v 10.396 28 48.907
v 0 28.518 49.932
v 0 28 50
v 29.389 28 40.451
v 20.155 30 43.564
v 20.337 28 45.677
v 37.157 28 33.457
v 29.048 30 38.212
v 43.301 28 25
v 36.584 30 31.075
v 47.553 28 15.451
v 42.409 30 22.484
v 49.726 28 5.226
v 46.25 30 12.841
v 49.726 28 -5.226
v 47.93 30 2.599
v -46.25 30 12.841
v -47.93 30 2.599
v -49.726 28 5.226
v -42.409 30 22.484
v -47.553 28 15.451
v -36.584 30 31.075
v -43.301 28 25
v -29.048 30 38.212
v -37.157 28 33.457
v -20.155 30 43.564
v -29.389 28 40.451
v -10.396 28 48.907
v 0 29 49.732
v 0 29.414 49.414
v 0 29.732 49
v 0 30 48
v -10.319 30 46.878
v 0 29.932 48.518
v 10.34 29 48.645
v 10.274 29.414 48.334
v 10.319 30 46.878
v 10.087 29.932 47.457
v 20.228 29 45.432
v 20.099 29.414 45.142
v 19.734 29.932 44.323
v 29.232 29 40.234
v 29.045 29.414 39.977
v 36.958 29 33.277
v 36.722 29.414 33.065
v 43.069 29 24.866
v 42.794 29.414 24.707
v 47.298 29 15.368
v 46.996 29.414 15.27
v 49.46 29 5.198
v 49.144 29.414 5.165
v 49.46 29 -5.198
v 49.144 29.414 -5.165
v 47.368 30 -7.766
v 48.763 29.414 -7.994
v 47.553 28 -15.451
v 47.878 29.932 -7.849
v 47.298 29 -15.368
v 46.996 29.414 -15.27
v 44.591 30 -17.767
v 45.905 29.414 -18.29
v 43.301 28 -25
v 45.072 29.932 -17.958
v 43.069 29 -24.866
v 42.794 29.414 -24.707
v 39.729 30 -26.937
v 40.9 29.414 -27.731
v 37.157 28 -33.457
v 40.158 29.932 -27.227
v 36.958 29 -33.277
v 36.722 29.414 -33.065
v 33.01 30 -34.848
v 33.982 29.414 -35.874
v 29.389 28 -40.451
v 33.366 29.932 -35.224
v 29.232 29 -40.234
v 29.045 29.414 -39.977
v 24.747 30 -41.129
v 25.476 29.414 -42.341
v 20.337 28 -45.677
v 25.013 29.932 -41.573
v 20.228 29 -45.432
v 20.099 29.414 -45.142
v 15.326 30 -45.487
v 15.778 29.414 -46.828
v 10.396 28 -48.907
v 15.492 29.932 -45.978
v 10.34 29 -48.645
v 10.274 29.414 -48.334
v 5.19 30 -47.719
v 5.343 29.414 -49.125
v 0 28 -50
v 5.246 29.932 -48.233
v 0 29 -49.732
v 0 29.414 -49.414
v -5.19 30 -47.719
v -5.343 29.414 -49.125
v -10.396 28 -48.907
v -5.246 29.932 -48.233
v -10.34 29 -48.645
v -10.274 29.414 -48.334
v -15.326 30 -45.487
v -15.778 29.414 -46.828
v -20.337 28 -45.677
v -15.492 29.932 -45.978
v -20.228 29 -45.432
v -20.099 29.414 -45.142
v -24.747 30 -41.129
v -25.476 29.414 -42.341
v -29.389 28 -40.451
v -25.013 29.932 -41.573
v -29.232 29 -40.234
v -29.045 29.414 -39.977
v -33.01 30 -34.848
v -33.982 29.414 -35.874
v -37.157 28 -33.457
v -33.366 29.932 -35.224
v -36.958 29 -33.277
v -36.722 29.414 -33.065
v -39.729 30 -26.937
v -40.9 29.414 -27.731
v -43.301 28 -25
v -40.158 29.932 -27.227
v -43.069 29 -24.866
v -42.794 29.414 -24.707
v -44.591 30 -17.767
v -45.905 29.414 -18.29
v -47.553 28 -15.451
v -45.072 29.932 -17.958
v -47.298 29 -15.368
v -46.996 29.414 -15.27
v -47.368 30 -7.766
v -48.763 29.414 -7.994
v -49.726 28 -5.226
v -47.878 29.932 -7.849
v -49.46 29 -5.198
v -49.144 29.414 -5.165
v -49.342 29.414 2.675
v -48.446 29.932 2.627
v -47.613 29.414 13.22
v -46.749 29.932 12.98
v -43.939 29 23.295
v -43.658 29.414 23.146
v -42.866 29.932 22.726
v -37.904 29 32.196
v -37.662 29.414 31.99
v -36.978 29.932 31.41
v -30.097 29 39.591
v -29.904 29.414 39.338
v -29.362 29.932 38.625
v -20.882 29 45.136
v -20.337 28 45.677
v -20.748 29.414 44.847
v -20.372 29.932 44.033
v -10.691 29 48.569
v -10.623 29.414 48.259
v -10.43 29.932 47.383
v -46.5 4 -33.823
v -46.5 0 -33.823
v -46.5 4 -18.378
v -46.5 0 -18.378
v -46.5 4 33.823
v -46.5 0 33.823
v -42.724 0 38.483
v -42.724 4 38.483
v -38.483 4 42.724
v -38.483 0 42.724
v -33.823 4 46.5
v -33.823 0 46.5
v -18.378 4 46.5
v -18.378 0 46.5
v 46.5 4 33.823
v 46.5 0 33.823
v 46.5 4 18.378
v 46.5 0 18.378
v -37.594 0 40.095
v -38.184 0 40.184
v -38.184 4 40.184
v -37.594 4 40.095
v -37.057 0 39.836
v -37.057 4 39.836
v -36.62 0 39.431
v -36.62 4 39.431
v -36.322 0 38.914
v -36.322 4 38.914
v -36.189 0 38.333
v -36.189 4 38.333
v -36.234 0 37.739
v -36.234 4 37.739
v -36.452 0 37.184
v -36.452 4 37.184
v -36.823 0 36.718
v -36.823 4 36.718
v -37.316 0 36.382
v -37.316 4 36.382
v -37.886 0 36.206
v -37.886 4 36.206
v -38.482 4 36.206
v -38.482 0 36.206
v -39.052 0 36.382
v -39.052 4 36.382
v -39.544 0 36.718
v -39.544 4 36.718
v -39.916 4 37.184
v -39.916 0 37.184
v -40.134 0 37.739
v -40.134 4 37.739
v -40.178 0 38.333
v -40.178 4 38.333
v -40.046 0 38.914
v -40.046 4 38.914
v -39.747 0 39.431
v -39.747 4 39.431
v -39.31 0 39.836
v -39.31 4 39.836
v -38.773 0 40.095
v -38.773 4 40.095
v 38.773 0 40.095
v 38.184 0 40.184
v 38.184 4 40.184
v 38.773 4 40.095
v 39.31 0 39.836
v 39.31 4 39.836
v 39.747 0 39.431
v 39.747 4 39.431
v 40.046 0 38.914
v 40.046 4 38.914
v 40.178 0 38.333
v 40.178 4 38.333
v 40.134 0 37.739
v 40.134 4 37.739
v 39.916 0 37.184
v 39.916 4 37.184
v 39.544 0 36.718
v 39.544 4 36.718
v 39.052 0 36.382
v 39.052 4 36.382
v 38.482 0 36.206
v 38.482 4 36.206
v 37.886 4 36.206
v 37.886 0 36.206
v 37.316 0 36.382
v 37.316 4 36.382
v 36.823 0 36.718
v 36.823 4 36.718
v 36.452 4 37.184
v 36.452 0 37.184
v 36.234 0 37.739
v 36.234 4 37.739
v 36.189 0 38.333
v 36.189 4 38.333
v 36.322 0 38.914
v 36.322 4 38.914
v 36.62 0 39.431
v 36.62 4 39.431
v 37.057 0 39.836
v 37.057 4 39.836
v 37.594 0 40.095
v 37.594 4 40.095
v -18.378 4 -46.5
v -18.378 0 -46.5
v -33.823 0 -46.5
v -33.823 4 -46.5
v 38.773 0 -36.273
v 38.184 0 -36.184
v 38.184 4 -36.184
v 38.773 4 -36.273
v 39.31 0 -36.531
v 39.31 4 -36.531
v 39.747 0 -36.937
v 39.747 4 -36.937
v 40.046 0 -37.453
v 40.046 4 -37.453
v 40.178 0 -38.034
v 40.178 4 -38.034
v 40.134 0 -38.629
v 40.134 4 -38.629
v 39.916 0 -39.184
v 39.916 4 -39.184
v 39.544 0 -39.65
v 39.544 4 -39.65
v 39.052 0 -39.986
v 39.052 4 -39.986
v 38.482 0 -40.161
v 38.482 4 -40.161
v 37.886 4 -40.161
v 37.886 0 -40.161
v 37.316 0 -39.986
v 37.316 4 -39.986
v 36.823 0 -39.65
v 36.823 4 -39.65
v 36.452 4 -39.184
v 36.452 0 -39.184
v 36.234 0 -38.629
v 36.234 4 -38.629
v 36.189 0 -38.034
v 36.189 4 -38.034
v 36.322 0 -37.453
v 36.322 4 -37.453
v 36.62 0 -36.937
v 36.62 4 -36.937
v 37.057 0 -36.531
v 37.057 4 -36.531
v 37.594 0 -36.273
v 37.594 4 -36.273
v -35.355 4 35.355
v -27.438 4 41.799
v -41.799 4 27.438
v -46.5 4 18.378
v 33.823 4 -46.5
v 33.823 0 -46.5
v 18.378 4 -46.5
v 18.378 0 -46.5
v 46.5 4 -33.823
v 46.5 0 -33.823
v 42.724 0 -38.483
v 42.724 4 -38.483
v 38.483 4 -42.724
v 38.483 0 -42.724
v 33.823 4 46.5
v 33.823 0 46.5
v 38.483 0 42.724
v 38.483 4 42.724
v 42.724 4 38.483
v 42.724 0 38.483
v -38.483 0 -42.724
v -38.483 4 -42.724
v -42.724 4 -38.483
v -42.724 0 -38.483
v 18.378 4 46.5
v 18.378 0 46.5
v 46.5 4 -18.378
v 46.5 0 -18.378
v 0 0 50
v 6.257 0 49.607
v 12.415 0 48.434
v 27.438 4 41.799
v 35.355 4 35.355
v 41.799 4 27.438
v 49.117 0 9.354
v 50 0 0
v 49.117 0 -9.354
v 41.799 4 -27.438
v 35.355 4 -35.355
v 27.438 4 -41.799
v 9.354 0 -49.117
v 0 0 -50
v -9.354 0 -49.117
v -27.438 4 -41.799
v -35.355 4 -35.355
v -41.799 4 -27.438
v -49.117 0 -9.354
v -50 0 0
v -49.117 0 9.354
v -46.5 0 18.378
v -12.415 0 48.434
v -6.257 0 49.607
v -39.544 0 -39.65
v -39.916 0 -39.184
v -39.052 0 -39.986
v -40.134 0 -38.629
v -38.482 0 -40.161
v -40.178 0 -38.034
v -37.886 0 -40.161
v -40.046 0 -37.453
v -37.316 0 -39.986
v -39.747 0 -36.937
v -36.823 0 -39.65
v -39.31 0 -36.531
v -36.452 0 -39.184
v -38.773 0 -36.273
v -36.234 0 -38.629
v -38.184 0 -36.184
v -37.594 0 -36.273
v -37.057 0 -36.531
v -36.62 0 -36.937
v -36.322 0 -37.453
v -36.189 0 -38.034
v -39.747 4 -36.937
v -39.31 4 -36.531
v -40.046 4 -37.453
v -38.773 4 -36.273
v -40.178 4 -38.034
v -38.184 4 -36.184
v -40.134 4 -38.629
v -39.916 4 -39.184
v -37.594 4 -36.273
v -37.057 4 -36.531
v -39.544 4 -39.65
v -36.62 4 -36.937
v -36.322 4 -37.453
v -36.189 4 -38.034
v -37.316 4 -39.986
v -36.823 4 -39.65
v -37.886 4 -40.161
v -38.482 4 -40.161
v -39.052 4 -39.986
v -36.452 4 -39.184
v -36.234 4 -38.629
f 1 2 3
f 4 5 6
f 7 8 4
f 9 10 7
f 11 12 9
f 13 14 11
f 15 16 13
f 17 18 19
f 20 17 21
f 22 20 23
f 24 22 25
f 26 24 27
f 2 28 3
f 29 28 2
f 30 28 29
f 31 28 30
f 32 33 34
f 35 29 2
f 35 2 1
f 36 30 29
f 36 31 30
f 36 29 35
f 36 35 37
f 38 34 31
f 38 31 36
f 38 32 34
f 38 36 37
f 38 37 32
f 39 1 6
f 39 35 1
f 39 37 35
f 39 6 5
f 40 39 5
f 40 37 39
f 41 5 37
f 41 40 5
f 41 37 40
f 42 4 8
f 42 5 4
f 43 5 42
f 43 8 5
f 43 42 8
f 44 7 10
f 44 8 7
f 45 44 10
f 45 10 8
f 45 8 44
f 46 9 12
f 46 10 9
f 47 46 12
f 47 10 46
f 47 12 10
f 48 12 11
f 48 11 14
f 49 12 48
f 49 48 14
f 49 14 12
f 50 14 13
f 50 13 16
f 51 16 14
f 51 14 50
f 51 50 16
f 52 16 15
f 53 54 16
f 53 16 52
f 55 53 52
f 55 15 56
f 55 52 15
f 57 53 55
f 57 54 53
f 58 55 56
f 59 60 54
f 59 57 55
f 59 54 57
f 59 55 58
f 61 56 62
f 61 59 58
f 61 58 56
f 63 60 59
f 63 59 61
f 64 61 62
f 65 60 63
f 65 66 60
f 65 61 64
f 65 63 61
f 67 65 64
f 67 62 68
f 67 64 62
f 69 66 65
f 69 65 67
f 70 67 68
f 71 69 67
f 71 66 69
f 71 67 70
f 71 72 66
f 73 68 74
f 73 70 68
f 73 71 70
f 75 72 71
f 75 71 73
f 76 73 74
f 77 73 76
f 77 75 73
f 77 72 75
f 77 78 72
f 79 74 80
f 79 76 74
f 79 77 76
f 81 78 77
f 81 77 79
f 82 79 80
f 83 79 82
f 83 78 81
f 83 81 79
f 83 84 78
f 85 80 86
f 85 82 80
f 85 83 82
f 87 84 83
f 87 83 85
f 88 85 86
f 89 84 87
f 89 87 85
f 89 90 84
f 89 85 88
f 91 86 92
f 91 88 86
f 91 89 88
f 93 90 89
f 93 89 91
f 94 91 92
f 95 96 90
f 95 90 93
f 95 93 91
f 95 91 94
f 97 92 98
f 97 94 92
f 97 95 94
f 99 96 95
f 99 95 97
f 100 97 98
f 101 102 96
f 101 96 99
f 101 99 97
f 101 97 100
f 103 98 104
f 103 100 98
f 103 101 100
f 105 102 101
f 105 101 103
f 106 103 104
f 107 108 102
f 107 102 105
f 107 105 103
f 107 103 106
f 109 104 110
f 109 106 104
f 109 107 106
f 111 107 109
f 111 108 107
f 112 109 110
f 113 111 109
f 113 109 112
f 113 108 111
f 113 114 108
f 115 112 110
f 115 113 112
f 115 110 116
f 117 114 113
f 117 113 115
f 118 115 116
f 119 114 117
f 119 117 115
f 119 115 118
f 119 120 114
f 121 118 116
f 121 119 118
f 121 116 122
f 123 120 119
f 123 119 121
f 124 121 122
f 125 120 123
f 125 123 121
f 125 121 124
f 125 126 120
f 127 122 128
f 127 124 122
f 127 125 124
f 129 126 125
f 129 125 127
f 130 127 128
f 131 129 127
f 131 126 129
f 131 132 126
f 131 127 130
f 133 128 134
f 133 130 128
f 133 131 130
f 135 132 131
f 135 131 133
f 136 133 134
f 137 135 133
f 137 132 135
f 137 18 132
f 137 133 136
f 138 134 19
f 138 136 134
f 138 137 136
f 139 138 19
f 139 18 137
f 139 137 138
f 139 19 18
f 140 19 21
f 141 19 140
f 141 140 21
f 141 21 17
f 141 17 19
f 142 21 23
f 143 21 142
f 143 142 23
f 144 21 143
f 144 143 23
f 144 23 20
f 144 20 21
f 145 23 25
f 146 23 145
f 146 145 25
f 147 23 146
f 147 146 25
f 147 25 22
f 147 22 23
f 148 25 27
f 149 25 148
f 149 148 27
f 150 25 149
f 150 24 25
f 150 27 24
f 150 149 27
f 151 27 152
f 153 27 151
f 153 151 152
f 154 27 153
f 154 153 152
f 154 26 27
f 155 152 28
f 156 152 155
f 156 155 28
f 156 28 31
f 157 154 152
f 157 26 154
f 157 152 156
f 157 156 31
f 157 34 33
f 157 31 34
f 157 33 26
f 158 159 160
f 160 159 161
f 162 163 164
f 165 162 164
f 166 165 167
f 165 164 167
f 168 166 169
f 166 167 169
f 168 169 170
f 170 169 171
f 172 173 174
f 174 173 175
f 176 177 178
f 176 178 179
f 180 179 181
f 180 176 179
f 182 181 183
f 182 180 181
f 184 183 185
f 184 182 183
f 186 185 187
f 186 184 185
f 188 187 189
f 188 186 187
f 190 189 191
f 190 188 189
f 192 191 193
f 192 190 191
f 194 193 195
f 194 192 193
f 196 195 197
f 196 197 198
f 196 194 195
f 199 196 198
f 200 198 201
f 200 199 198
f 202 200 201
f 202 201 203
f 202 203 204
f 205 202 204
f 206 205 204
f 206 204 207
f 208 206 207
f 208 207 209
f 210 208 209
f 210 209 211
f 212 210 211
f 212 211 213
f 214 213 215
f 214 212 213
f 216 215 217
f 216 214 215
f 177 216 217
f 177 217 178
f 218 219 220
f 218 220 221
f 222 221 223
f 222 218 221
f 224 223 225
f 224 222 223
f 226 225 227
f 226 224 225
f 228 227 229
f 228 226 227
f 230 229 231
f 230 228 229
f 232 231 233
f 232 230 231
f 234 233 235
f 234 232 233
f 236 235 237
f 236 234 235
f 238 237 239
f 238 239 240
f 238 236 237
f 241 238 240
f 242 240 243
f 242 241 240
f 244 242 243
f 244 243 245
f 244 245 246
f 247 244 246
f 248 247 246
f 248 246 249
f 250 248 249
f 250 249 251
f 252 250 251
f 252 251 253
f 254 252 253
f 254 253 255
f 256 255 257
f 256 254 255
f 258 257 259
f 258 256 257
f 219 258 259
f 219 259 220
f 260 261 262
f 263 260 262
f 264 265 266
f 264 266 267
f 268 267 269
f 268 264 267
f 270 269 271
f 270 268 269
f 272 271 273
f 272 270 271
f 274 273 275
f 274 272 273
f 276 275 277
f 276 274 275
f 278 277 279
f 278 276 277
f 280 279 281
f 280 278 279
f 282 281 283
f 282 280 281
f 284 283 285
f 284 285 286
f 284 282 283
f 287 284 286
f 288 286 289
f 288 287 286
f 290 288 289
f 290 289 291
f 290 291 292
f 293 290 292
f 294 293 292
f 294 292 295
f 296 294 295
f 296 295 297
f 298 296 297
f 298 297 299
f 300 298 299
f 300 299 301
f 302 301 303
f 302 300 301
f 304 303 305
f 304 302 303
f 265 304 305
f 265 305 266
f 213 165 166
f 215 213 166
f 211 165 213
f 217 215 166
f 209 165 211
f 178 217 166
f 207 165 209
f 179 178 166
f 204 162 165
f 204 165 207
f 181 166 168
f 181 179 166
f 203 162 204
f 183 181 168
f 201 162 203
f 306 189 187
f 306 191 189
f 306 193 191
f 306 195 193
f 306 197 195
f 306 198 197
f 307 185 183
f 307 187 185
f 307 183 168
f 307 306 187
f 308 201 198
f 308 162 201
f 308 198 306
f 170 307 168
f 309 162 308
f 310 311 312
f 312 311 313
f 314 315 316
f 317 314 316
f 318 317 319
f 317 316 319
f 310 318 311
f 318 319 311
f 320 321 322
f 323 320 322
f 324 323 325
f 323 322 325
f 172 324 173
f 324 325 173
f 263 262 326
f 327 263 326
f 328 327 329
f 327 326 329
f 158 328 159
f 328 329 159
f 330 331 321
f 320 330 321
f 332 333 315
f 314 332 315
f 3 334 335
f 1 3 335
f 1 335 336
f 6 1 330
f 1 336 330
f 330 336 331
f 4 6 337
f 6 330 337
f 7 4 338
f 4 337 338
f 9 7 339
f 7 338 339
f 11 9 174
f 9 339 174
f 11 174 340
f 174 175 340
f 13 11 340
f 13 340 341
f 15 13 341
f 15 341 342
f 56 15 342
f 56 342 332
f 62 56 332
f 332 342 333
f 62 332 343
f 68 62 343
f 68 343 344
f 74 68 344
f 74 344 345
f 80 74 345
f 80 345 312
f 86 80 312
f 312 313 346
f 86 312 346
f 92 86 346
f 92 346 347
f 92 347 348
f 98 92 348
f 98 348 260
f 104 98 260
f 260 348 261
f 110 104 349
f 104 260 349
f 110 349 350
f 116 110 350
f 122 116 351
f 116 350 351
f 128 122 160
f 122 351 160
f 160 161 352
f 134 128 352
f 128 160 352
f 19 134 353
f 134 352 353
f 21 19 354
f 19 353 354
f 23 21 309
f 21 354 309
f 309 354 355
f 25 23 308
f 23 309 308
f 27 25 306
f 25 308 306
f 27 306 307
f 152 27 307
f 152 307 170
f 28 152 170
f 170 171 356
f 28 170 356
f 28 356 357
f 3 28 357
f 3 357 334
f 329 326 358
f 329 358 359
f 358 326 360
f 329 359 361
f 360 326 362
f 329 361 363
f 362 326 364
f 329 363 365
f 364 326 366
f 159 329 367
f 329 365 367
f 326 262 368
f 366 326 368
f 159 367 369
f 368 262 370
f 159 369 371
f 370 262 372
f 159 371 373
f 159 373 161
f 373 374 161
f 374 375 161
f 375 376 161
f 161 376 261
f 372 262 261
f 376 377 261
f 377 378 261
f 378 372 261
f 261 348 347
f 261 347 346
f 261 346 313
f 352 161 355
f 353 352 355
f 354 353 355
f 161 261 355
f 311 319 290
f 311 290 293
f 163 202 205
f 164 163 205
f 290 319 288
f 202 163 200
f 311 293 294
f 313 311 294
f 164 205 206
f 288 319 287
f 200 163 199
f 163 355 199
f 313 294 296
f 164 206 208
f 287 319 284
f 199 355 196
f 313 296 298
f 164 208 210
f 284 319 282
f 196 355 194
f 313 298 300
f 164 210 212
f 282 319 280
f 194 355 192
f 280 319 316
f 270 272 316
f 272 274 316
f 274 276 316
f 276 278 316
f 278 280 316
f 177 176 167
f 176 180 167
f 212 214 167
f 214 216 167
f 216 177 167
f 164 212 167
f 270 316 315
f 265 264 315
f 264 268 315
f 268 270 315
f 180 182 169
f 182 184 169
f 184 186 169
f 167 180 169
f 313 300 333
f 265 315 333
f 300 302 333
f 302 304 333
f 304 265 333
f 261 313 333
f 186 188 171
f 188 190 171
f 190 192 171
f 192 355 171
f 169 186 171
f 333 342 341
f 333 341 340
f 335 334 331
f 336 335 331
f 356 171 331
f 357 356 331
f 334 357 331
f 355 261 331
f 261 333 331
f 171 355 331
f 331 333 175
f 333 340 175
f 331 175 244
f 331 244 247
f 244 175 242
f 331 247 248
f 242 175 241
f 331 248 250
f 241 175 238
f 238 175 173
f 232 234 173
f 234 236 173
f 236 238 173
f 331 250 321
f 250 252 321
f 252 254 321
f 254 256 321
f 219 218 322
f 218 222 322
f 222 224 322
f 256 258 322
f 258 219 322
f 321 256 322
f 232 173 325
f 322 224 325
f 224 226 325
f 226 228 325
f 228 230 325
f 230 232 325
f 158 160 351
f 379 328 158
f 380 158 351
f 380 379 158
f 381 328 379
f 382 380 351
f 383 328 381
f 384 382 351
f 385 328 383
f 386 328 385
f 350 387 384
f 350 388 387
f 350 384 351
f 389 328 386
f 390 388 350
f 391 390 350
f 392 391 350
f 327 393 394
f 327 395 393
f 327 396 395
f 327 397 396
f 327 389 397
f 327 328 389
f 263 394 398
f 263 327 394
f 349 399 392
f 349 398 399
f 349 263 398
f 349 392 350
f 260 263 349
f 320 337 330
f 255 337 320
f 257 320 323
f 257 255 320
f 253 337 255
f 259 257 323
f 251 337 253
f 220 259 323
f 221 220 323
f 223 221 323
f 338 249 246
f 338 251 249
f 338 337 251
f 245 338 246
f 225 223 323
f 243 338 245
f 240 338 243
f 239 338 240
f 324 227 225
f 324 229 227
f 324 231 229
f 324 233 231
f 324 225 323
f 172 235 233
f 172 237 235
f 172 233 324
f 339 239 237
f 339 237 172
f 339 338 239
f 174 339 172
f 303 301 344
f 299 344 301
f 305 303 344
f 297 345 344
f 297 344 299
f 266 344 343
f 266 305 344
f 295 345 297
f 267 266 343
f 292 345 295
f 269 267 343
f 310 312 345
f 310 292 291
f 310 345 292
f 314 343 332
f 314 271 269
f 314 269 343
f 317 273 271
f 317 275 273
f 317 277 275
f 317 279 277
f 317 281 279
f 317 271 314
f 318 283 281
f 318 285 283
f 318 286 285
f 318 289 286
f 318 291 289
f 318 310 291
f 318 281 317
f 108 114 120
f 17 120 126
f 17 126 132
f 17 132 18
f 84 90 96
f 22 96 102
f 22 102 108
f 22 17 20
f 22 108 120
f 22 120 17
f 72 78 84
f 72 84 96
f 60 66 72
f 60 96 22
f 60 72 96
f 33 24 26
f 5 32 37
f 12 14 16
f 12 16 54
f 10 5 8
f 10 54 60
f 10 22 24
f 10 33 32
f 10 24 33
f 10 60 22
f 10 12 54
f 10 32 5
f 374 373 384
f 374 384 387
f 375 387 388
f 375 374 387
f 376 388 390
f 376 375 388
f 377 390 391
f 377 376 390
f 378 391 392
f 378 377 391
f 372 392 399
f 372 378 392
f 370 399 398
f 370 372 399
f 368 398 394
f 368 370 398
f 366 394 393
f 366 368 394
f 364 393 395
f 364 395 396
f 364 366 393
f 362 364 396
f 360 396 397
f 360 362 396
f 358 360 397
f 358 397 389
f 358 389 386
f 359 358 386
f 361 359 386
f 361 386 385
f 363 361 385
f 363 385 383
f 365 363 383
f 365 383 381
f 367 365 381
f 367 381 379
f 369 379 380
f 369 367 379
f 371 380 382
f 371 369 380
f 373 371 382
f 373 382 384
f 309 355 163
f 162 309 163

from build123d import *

# Parameters (mm, degrees)
SKETCH1_R           = 50
BOSS_EXTRUDE1_DEPTH = 30
SKETCH1_3_R         = 2
BOSS_EXTRUDE2_DEPTH = 4
FILLET2_R           = 2


with BuildPart() as part:
    # Sketch1 → Boss-Extrude1 (new body)
    with BuildSketch(Plane(origin=(0, 0, 0), x_dir=(1, 0, 0), z_dir=(0, 1, 0))):
        Circle(SKETCH1_R)
    extrude(amount=BOSS_EXTRUDE1_DEPTH)

    # Sketch1<3> → Boss-Extrude2 (add)
    # profile 1 of 4: a face of its own
    with BuildSketch(Plane(origin=(0, 0, 0), x_dir=(1, 0, 0), z_dir=(0, 1, 0))):
        with BuildLine():
            Line((-33.823069051, -46.5), (-18.377975949, -46.5))
            ThreePointArc((-18.377975949, -46.5), (-35.355339059, -35.355339059), (-46.5, -18.377975949))
            Line((-46.5, -18.377975949), (-46.5, -33.823069051))
            ThreePointArc((-46.5, -33.823069051), (-40.658639918, -40.658639918), (-33.823069051, -46.5))
        make_face()
        with Locations((-38.183766184, -38.183766184)):
            Circle(SKETCH1_3_R, mode=Mode.SUBTRACT)
    # profile 2 of 4: a face of its own
    with BuildSketch(Plane(origin=(0, 0, 0), x_dir=(1, 0, 0), z_dir=(0, 1, 0))):
        with BuildLine():
            ThreePointArc((46.5, -18.377975949), (35.355339059, -35.355339059), (18.377975949, -46.5))
            Line((18.377975949, -46.5), (33.823069051, -46.5))
            ThreePointArc((33.823069051, -46.5), (40.658639918, -40.658639918), (46.5, -33.823069051))
            Line((46.5, -33.823069051), (46.5, -18.377975949))
        make_face()
        with Locations((38.183766184, -38.183766184)):
            Circle(SKETCH1_3_R, mode=Mode.SUBTRACT)
    # profile 3 of 4: a face of its own
    with BuildSketch(Plane(origin=(0, 0, 0), x_dir=(1, 0, 0), z_dir=(0, 1, 0))):
        with BuildLine():
            Line((-46.5, 33.823069051), (-46.5, 18.377975949))
            ThreePointArc((-46.5, 18.377975949), (-35.355339059, 35.355339059), (-18.377975949, 46.5))
            Line((-18.377975949, 46.5), (-33.823069051, 46.5))
            ThreePointArc((-33.823069051, 46.5), (-40.658639918, 40.658639918), (-46.5, 33.823069051))
        make_face()
        with Locations((-38.183766184, 38.183766184)):
            Circle(SKETCH1_3_R, mode=Mode.SUBTRACT)
    # profile 4 of 4: a face of its own
    with BuildSketch(Plane(origin=(0, 0, 0), x_dir=(1, 0, 0), z_dir=(0, 1, 0))):
        with BuildLine():
            Line((33.823069051, 46.5), (18.377975949, 46.5))
            ThreePointArc((18.377975949, 46.5), (35.355339059, 35.355339059), (46.5, 18.377975949))
            Line((46.5, 18.377975949), (46.5, 33.823069051))
            ThreePointArc((46.5, 33.823069051), (40.658639918, 40.658639918), (33.823069051, 46.5))
        make_face()
        with Locations((38.183766184, 38.183766184)):
            Circle(SKETCH1_3_R, mode=Mode.SUBTRACT)
    extrude(amount=BOSS_EXTRUDE2_DEPTH)

    # Fillet2
    fillet2_edges = [part.edges().sort_by_distance(p)[0] for p in [
        (-50, 30, 0),
    ]]
    fillet(fillet2_edges, radius=FILLET2_R)


solid = part.part
